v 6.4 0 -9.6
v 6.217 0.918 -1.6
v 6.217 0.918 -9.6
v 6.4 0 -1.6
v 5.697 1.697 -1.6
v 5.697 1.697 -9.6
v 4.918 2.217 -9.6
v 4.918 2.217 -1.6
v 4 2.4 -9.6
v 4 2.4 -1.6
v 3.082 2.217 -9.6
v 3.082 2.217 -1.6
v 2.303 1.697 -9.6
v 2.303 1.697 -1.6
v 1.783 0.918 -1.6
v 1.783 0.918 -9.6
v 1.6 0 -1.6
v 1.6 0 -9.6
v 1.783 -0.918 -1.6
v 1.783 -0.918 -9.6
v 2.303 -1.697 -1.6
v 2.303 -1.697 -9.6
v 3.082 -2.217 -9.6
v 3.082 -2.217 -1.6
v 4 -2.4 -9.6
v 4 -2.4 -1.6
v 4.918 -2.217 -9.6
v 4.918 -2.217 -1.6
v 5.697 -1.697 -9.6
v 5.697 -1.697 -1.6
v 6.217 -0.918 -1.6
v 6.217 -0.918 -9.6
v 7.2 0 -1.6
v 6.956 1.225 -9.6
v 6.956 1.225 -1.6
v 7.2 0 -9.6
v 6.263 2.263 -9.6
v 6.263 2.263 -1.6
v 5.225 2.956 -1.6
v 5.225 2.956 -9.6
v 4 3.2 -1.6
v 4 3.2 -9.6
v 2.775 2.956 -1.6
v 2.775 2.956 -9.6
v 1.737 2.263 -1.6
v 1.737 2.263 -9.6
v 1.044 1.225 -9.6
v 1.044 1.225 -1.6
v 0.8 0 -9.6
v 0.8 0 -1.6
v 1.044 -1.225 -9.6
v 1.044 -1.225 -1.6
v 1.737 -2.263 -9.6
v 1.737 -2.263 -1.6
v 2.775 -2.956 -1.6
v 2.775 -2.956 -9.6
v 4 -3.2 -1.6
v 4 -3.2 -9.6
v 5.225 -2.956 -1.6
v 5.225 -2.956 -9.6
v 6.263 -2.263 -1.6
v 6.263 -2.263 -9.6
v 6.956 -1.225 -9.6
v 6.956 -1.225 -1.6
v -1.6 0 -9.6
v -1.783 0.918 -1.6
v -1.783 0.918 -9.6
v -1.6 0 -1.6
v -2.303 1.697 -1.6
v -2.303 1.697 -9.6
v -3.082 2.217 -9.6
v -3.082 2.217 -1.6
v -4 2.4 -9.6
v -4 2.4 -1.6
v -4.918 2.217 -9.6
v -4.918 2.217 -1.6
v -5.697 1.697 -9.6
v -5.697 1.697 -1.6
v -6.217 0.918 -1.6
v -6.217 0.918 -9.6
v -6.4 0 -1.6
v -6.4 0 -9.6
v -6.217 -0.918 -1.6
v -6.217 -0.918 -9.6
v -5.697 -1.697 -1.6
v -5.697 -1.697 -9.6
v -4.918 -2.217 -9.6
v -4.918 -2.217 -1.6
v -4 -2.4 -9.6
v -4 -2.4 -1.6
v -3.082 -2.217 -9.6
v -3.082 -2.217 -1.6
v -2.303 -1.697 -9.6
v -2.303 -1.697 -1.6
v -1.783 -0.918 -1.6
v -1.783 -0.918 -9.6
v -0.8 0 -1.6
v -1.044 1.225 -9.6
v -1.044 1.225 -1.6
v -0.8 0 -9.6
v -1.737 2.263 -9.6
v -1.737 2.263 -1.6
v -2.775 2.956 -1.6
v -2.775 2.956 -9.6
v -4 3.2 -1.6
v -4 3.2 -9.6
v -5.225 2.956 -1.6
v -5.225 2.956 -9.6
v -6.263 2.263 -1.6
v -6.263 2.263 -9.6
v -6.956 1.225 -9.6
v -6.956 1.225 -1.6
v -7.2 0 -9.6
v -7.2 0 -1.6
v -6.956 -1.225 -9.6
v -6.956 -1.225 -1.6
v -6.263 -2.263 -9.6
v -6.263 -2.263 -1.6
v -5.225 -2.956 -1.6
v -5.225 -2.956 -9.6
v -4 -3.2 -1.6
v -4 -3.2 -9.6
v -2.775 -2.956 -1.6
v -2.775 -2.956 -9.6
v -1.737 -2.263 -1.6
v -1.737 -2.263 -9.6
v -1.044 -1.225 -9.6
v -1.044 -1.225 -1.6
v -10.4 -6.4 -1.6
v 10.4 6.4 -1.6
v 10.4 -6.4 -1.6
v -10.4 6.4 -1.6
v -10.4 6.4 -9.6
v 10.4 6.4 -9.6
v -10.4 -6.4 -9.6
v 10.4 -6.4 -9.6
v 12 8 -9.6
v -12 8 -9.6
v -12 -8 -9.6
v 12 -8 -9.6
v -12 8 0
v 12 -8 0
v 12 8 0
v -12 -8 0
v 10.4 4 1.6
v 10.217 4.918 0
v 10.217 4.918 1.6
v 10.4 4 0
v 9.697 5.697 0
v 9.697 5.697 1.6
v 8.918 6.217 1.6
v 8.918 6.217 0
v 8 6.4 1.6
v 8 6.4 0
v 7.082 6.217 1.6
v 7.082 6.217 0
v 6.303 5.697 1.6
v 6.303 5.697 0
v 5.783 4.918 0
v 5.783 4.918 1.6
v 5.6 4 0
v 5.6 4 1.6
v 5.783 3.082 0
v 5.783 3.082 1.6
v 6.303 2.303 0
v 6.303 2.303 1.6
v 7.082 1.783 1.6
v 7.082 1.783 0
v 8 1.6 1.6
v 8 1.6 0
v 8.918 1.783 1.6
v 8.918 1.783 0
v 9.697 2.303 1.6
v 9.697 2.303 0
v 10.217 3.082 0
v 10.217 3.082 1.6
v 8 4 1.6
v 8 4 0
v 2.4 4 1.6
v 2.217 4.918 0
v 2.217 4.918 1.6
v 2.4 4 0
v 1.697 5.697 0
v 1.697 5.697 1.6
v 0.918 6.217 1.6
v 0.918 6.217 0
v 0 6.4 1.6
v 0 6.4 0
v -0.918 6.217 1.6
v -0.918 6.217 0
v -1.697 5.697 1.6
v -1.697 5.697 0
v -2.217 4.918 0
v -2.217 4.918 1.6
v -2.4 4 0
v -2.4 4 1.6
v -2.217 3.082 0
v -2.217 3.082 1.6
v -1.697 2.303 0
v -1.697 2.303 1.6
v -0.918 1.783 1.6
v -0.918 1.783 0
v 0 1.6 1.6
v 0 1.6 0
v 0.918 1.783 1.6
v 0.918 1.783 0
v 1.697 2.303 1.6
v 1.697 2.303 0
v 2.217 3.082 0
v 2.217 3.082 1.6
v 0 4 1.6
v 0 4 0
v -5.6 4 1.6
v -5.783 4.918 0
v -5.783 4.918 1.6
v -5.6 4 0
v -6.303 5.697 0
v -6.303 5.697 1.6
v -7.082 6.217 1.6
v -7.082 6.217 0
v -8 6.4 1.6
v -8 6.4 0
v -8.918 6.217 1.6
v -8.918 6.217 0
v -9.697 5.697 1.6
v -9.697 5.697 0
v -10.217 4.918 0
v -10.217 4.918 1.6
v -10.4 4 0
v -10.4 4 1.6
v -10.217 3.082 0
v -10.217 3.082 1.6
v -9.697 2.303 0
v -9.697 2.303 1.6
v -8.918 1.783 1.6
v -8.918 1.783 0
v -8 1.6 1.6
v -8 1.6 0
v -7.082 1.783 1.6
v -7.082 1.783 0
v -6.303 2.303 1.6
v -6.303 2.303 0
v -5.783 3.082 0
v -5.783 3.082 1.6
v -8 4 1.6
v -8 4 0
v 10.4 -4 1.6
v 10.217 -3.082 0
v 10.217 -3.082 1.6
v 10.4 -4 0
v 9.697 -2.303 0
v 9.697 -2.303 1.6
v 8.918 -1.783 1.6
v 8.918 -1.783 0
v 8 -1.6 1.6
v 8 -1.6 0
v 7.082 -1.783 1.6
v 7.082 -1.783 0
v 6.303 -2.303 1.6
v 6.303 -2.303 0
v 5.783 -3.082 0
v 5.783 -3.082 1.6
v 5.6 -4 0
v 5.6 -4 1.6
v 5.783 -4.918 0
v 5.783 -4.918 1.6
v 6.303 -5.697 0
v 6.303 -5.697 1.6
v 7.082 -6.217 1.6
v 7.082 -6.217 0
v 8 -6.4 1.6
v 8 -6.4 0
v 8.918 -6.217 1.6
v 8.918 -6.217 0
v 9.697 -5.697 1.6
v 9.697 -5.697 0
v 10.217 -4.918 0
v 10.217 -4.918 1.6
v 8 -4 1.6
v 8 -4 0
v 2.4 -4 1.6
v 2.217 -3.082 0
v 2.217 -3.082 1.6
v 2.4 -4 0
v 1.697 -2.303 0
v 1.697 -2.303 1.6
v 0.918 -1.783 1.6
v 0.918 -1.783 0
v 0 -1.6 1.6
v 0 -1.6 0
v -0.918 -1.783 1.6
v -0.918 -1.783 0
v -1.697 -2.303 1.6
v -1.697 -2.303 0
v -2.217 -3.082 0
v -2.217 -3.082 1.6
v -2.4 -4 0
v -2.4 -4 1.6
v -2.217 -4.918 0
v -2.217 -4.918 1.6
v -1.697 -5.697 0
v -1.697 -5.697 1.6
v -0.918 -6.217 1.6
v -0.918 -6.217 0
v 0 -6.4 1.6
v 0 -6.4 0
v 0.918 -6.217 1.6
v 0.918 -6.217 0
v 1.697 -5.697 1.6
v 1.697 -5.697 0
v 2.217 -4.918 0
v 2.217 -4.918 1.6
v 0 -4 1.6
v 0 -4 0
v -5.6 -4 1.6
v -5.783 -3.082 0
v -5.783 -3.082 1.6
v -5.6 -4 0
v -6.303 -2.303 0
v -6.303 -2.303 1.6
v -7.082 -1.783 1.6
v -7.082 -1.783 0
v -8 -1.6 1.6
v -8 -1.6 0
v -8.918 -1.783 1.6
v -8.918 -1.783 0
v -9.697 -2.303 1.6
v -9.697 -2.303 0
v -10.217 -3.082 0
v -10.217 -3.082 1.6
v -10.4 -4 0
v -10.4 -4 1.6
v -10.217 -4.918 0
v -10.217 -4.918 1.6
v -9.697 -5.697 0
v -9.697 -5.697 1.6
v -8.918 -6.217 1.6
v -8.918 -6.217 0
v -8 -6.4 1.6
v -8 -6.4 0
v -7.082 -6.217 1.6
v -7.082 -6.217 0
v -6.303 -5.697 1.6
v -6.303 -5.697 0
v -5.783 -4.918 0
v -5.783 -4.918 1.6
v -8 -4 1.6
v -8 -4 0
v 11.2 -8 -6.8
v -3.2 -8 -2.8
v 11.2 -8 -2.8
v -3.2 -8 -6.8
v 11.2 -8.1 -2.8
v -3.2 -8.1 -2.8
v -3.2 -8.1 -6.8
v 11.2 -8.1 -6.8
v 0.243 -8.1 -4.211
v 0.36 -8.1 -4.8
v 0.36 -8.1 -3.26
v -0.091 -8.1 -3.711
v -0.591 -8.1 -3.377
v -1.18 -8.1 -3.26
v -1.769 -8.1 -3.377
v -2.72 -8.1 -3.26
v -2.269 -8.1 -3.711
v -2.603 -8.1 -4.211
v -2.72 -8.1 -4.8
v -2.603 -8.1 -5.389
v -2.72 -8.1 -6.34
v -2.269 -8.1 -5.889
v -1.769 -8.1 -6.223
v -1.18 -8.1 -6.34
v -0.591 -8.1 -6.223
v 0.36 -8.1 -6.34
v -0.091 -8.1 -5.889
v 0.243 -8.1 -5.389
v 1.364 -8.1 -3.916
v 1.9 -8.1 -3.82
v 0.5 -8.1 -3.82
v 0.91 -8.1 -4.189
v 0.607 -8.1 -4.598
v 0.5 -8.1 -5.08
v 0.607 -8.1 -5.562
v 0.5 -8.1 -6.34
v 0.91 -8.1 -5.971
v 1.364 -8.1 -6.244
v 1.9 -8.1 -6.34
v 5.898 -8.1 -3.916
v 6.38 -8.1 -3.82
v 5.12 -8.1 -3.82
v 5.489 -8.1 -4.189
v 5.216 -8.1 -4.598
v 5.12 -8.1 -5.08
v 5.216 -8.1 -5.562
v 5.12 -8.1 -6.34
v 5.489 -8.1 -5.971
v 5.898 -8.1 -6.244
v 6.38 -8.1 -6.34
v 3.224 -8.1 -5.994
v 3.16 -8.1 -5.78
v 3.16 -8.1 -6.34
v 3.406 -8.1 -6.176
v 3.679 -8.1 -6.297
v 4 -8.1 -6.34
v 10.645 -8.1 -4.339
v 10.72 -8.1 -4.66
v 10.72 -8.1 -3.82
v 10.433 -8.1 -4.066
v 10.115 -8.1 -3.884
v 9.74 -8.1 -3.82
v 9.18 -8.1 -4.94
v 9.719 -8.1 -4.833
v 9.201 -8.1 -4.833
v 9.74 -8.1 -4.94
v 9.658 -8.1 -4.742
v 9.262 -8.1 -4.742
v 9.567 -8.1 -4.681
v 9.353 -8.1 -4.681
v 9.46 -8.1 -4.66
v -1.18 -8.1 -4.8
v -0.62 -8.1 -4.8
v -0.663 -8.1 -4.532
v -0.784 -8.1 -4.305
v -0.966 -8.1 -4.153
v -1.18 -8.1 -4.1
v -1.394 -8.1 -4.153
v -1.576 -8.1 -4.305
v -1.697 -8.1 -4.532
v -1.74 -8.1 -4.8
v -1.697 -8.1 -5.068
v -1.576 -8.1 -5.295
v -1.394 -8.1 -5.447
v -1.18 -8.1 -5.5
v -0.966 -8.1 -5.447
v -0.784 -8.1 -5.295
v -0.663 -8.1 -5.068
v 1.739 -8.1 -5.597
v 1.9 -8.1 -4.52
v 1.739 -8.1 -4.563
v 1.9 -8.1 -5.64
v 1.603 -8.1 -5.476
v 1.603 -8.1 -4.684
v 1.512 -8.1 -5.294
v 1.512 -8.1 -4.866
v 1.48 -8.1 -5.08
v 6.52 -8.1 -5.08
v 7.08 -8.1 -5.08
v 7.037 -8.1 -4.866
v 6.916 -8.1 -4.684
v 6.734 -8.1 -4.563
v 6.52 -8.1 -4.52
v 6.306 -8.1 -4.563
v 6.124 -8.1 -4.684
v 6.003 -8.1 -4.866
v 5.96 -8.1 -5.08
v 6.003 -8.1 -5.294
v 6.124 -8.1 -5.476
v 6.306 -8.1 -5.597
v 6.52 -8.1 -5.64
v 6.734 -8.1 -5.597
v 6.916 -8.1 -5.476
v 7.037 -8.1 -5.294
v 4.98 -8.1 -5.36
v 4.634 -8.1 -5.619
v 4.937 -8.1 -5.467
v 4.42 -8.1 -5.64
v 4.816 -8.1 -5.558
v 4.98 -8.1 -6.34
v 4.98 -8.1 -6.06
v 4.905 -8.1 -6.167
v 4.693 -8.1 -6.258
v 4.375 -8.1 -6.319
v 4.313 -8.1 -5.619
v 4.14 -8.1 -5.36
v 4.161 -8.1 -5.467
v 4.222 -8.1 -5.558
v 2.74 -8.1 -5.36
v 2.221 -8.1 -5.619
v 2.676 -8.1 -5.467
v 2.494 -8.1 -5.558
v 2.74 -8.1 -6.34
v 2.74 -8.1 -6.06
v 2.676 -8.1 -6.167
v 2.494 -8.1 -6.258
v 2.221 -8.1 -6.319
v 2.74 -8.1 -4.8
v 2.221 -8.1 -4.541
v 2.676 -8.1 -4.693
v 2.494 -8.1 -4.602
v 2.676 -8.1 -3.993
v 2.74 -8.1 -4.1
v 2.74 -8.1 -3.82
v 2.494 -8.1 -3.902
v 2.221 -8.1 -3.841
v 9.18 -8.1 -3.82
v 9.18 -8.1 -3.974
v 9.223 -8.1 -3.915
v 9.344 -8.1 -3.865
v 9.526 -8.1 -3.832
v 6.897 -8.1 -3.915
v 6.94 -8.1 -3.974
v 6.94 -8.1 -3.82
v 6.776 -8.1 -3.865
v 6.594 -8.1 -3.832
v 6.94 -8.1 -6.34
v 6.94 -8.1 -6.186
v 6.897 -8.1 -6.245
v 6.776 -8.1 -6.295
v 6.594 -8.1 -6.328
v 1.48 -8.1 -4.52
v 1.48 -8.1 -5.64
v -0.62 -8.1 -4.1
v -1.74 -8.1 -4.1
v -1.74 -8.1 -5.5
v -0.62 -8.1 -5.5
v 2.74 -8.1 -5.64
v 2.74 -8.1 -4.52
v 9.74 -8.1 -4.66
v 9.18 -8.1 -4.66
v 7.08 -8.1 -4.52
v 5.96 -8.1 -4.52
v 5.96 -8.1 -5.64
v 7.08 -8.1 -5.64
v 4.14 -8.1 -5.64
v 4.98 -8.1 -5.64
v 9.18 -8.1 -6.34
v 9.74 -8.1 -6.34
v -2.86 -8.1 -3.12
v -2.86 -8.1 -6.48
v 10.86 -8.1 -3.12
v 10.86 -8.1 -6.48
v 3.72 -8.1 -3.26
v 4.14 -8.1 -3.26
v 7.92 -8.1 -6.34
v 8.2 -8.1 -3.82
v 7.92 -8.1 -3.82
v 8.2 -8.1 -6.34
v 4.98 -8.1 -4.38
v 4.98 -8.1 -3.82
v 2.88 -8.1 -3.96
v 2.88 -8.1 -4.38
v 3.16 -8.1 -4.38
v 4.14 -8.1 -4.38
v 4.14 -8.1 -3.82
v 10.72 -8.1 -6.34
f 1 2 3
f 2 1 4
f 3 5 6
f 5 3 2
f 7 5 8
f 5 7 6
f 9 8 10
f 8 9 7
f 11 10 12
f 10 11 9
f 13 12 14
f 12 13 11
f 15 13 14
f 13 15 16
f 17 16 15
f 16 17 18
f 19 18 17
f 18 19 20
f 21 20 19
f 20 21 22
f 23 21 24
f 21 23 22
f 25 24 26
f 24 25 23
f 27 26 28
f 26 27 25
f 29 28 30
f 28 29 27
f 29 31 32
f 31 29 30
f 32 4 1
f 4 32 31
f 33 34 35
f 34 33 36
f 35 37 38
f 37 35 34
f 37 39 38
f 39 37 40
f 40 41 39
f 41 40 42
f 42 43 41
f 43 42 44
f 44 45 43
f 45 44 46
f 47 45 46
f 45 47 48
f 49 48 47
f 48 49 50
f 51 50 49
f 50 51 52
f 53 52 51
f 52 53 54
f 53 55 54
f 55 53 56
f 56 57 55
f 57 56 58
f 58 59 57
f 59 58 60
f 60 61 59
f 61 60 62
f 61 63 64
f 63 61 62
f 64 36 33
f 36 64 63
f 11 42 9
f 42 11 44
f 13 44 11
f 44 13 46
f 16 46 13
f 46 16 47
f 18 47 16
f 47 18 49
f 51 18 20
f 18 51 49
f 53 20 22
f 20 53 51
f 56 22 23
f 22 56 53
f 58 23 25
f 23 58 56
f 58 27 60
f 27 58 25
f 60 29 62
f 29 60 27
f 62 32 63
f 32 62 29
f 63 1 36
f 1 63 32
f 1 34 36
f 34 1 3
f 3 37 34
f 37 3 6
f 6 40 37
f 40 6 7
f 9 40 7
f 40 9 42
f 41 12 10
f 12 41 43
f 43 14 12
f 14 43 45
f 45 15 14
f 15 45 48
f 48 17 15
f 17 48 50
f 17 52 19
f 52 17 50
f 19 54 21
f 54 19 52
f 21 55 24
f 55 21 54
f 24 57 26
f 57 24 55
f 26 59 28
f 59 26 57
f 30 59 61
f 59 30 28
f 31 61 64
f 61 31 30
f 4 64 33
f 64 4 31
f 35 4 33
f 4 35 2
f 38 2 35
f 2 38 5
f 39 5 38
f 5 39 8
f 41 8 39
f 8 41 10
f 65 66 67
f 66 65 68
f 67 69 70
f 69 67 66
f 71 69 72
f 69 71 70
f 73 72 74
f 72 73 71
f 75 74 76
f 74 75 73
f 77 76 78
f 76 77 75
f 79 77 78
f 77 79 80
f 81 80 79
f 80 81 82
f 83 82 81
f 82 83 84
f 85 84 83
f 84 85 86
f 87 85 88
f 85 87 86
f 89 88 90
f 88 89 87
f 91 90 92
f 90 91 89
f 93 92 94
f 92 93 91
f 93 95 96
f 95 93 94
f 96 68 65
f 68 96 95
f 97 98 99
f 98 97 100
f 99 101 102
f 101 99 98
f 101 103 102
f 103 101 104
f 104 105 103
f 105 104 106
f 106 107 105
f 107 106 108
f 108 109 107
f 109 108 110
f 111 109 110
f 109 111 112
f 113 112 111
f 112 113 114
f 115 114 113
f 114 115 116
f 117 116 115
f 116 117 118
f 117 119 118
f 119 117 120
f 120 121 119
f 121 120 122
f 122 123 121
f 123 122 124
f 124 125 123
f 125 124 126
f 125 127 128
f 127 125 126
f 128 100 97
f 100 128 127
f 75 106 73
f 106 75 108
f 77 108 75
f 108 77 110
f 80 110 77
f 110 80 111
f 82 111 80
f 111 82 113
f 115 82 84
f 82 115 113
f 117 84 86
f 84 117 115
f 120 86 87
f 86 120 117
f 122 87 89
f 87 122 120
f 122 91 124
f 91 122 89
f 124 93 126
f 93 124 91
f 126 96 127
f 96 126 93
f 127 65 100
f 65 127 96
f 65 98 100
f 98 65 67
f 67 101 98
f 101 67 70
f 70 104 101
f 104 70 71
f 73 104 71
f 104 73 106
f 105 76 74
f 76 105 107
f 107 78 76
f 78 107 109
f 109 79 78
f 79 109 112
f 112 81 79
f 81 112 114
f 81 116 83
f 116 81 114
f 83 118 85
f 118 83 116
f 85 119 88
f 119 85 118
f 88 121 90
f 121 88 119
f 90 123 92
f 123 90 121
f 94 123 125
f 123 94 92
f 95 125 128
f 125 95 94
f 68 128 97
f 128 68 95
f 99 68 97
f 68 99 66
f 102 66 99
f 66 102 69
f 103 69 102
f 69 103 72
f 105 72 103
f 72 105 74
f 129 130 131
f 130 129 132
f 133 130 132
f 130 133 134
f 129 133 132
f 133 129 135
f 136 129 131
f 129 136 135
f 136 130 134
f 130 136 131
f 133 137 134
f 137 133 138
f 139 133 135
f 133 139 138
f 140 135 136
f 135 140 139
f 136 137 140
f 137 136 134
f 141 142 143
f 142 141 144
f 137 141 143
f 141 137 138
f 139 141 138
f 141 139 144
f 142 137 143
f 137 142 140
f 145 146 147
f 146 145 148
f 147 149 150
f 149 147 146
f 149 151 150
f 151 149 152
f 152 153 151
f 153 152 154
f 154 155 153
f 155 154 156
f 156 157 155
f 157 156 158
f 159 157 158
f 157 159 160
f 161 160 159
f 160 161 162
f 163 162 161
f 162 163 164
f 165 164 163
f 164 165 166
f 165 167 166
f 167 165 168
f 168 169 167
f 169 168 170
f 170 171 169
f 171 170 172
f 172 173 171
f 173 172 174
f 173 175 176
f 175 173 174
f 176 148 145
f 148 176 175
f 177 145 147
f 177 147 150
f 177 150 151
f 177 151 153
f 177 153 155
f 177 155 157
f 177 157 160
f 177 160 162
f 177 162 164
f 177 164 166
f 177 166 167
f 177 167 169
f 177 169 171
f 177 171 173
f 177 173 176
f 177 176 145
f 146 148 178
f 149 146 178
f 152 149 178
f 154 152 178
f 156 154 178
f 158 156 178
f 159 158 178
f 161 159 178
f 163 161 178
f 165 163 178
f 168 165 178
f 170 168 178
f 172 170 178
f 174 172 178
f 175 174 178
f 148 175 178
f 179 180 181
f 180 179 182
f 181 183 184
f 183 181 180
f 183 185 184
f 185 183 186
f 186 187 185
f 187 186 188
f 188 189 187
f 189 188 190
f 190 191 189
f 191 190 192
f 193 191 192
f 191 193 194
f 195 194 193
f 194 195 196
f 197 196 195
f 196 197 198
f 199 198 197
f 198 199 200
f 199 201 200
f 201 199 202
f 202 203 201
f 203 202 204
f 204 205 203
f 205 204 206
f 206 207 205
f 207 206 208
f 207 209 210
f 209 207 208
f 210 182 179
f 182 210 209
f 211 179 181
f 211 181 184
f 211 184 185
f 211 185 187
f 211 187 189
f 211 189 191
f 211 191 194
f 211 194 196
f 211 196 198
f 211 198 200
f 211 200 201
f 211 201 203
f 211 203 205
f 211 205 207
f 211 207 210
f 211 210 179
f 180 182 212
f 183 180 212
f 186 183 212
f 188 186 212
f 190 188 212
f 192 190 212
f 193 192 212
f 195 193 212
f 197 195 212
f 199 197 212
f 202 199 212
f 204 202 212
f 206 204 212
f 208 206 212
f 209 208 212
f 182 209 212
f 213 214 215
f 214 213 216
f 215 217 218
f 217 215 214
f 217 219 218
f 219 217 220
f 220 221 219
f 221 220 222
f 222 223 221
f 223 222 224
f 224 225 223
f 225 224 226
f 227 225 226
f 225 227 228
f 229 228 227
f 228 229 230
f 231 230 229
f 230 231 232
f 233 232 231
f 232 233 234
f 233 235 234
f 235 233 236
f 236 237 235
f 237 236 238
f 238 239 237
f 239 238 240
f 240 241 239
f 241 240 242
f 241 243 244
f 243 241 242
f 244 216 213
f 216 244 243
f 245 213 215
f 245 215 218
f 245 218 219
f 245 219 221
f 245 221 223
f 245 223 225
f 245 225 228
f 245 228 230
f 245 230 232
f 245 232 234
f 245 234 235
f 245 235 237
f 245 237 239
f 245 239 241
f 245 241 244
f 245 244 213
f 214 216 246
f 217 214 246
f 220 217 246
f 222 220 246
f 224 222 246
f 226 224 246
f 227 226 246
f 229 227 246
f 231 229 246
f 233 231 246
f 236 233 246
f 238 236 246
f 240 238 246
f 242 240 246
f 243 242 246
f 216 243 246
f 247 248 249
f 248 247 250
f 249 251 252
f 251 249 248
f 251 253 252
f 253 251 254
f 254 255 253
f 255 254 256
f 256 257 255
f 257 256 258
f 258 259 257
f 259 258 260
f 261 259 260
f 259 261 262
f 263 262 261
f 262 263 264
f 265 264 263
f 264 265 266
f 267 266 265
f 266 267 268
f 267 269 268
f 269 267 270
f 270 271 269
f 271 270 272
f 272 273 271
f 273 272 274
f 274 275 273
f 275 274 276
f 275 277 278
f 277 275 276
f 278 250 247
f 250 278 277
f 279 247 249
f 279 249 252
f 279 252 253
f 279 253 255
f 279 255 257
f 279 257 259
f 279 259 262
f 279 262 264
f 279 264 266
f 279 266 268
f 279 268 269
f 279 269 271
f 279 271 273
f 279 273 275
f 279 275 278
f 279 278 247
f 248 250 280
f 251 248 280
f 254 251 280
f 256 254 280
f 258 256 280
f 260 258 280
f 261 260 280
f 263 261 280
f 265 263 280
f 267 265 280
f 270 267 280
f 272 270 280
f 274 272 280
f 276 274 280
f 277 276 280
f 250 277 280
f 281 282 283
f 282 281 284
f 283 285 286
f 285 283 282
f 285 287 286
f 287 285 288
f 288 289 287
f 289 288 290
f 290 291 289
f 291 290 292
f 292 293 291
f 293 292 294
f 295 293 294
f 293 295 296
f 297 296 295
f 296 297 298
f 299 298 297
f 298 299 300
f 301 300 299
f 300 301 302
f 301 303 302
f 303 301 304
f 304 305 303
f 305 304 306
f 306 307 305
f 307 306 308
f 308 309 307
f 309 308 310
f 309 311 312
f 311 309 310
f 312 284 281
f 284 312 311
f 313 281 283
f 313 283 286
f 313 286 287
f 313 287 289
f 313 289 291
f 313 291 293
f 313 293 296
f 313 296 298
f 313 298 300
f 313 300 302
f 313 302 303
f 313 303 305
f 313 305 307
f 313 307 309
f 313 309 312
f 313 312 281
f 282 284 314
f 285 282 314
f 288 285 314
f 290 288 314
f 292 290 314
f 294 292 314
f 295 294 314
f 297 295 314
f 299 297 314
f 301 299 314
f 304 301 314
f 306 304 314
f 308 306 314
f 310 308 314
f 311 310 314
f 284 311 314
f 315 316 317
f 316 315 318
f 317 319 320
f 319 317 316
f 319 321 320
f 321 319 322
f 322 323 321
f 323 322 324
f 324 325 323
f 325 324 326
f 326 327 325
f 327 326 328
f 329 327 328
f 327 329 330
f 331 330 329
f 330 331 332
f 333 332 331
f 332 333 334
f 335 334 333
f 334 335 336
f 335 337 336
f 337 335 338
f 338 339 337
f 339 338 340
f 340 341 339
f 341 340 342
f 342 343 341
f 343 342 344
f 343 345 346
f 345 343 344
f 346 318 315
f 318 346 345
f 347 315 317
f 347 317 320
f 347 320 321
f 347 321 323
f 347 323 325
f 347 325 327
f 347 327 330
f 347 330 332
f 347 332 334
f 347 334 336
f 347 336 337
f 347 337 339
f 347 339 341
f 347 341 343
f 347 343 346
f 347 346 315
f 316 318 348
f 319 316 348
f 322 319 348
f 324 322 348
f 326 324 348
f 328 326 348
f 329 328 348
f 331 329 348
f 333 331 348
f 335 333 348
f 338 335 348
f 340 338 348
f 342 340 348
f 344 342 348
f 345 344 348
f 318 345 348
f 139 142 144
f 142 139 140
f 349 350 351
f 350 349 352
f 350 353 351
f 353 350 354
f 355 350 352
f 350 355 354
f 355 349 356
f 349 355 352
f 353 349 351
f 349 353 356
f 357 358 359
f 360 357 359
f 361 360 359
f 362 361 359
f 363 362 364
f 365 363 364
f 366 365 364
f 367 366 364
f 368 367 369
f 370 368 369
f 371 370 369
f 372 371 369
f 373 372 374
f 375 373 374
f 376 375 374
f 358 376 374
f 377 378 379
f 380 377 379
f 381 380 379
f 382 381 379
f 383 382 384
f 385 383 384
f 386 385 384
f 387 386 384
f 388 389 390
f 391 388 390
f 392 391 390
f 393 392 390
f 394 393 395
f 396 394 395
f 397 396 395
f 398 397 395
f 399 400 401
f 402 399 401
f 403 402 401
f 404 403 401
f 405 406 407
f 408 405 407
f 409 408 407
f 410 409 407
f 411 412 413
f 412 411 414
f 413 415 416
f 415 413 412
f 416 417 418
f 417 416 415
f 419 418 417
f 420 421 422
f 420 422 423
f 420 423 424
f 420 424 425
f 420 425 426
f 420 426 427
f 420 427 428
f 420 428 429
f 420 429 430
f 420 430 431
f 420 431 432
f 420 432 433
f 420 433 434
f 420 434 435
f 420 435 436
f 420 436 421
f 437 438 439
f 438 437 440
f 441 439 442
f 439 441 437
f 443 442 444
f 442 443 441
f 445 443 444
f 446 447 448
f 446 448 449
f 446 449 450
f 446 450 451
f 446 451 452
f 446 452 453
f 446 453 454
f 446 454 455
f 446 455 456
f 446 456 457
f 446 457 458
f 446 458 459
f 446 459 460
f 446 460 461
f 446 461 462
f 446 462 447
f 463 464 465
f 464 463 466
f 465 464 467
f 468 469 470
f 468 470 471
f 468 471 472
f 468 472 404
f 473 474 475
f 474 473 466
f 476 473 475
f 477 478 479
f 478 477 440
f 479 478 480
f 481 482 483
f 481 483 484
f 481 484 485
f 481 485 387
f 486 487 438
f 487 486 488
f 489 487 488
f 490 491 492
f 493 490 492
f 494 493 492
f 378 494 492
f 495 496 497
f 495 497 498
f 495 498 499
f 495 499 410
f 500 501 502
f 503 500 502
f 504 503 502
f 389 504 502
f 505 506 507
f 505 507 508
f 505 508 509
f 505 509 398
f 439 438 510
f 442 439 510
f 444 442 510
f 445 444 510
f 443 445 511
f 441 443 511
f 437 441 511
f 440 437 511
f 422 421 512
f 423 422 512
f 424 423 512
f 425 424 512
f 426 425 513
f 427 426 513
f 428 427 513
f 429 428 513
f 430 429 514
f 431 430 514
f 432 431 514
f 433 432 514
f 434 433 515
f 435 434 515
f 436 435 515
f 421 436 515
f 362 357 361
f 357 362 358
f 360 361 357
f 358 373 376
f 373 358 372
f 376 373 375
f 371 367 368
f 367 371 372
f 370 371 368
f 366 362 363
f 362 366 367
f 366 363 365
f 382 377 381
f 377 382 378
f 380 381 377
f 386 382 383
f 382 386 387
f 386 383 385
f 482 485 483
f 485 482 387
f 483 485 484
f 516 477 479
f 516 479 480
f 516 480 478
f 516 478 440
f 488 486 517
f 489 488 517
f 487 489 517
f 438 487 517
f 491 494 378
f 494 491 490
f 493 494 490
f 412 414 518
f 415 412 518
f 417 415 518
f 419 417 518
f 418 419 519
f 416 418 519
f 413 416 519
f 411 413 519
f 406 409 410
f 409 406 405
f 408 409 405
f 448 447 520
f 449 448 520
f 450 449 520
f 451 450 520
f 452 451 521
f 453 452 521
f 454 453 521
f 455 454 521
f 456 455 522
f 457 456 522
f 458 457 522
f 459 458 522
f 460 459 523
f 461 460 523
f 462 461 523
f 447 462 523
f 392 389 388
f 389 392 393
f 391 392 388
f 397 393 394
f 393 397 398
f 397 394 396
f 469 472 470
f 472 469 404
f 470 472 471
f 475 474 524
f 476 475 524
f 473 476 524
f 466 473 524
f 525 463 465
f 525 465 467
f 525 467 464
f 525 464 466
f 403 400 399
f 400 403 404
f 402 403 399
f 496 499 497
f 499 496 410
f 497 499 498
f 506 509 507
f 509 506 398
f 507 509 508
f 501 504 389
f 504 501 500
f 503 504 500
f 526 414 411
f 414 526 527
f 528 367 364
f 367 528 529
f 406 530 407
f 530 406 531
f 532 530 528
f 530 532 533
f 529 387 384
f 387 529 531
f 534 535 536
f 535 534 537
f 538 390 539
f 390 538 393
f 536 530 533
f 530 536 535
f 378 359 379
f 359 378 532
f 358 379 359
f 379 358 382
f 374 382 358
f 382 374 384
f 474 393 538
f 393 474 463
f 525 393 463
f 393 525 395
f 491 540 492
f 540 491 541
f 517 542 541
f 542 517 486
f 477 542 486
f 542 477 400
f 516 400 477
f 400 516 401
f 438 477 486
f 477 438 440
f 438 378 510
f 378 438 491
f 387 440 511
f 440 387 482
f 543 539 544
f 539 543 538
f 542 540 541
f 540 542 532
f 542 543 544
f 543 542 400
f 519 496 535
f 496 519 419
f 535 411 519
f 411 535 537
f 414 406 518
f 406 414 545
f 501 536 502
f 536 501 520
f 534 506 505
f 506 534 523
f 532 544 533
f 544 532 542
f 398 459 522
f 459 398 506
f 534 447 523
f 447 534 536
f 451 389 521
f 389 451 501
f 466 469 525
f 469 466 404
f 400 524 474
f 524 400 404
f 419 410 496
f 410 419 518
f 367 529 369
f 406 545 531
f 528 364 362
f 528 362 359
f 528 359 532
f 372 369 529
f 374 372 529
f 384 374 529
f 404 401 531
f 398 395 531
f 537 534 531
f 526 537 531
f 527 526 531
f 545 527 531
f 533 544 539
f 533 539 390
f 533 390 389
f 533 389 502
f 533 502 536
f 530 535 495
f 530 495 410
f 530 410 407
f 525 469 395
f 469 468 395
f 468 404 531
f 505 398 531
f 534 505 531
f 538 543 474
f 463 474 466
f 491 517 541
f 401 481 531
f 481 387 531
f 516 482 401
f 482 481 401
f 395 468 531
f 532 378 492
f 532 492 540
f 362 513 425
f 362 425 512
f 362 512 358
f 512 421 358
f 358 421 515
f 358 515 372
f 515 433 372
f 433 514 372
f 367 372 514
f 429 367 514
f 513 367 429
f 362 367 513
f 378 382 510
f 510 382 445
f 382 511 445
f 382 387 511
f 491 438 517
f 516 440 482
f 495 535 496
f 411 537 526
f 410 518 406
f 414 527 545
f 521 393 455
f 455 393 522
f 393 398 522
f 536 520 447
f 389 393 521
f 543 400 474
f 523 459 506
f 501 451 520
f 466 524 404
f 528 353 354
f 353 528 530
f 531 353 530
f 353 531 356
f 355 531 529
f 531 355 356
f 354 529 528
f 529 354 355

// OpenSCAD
use <../lib.scad>
use <165495c.scad>
use <3002.scad>
function ldraw_lib__3002d06() = [
// 0 Brick  2 x  3 with Octan Right Sticker
// 0 Name: 3002d06.dat
// 0 Author: Takeshi Takahashi [RainbowDolphin]
// 0 !LDRAW_ORG Shortcut UPDATE 2024-08
// 0 !LICENSE Licensed under CC BY 4.0 : see CAreadme.txt
// 
// 0 BFC CERTIFY CCW
  [0,"BFC","CERTIFY"],
  [0,"BFC","CCW"],
// 
// 0 !CATEGORY Sticker Shortcut
// 0 !KEYWORDS Bricklink 3002pb37R, Gas Station, Set 6397
// 
// 0 !HISTORY 2024-09-30 [OrionP] Official Update 2024-08
// 
// 1 16 0 0 0 1 0 0 0 1 0 0 0 1 3002.dat
  [1,16,0,0,0,1,0,0,0,1,0,0,0,1, ldraw_lib__3002()],
// 1 16 10 12 -20 1 0 0 0 0 -1 0 1 0 165495c.dat
  [1,16,10,12,-20,1,0,0,0,0,-1,0,1,0, ldraw_lib__165495c()],
];
module ldraw_lib__3002d06(step=0, col=false, unit=2/5, alt=false, line=0.2, solid=!$preview)
    makepoly(ldraw_lib__3002d06(), step=step, col=col, unit=unit, alt=alt, line=line, solid=solid);
ldraw_lib__3002d06(line=0.2);
